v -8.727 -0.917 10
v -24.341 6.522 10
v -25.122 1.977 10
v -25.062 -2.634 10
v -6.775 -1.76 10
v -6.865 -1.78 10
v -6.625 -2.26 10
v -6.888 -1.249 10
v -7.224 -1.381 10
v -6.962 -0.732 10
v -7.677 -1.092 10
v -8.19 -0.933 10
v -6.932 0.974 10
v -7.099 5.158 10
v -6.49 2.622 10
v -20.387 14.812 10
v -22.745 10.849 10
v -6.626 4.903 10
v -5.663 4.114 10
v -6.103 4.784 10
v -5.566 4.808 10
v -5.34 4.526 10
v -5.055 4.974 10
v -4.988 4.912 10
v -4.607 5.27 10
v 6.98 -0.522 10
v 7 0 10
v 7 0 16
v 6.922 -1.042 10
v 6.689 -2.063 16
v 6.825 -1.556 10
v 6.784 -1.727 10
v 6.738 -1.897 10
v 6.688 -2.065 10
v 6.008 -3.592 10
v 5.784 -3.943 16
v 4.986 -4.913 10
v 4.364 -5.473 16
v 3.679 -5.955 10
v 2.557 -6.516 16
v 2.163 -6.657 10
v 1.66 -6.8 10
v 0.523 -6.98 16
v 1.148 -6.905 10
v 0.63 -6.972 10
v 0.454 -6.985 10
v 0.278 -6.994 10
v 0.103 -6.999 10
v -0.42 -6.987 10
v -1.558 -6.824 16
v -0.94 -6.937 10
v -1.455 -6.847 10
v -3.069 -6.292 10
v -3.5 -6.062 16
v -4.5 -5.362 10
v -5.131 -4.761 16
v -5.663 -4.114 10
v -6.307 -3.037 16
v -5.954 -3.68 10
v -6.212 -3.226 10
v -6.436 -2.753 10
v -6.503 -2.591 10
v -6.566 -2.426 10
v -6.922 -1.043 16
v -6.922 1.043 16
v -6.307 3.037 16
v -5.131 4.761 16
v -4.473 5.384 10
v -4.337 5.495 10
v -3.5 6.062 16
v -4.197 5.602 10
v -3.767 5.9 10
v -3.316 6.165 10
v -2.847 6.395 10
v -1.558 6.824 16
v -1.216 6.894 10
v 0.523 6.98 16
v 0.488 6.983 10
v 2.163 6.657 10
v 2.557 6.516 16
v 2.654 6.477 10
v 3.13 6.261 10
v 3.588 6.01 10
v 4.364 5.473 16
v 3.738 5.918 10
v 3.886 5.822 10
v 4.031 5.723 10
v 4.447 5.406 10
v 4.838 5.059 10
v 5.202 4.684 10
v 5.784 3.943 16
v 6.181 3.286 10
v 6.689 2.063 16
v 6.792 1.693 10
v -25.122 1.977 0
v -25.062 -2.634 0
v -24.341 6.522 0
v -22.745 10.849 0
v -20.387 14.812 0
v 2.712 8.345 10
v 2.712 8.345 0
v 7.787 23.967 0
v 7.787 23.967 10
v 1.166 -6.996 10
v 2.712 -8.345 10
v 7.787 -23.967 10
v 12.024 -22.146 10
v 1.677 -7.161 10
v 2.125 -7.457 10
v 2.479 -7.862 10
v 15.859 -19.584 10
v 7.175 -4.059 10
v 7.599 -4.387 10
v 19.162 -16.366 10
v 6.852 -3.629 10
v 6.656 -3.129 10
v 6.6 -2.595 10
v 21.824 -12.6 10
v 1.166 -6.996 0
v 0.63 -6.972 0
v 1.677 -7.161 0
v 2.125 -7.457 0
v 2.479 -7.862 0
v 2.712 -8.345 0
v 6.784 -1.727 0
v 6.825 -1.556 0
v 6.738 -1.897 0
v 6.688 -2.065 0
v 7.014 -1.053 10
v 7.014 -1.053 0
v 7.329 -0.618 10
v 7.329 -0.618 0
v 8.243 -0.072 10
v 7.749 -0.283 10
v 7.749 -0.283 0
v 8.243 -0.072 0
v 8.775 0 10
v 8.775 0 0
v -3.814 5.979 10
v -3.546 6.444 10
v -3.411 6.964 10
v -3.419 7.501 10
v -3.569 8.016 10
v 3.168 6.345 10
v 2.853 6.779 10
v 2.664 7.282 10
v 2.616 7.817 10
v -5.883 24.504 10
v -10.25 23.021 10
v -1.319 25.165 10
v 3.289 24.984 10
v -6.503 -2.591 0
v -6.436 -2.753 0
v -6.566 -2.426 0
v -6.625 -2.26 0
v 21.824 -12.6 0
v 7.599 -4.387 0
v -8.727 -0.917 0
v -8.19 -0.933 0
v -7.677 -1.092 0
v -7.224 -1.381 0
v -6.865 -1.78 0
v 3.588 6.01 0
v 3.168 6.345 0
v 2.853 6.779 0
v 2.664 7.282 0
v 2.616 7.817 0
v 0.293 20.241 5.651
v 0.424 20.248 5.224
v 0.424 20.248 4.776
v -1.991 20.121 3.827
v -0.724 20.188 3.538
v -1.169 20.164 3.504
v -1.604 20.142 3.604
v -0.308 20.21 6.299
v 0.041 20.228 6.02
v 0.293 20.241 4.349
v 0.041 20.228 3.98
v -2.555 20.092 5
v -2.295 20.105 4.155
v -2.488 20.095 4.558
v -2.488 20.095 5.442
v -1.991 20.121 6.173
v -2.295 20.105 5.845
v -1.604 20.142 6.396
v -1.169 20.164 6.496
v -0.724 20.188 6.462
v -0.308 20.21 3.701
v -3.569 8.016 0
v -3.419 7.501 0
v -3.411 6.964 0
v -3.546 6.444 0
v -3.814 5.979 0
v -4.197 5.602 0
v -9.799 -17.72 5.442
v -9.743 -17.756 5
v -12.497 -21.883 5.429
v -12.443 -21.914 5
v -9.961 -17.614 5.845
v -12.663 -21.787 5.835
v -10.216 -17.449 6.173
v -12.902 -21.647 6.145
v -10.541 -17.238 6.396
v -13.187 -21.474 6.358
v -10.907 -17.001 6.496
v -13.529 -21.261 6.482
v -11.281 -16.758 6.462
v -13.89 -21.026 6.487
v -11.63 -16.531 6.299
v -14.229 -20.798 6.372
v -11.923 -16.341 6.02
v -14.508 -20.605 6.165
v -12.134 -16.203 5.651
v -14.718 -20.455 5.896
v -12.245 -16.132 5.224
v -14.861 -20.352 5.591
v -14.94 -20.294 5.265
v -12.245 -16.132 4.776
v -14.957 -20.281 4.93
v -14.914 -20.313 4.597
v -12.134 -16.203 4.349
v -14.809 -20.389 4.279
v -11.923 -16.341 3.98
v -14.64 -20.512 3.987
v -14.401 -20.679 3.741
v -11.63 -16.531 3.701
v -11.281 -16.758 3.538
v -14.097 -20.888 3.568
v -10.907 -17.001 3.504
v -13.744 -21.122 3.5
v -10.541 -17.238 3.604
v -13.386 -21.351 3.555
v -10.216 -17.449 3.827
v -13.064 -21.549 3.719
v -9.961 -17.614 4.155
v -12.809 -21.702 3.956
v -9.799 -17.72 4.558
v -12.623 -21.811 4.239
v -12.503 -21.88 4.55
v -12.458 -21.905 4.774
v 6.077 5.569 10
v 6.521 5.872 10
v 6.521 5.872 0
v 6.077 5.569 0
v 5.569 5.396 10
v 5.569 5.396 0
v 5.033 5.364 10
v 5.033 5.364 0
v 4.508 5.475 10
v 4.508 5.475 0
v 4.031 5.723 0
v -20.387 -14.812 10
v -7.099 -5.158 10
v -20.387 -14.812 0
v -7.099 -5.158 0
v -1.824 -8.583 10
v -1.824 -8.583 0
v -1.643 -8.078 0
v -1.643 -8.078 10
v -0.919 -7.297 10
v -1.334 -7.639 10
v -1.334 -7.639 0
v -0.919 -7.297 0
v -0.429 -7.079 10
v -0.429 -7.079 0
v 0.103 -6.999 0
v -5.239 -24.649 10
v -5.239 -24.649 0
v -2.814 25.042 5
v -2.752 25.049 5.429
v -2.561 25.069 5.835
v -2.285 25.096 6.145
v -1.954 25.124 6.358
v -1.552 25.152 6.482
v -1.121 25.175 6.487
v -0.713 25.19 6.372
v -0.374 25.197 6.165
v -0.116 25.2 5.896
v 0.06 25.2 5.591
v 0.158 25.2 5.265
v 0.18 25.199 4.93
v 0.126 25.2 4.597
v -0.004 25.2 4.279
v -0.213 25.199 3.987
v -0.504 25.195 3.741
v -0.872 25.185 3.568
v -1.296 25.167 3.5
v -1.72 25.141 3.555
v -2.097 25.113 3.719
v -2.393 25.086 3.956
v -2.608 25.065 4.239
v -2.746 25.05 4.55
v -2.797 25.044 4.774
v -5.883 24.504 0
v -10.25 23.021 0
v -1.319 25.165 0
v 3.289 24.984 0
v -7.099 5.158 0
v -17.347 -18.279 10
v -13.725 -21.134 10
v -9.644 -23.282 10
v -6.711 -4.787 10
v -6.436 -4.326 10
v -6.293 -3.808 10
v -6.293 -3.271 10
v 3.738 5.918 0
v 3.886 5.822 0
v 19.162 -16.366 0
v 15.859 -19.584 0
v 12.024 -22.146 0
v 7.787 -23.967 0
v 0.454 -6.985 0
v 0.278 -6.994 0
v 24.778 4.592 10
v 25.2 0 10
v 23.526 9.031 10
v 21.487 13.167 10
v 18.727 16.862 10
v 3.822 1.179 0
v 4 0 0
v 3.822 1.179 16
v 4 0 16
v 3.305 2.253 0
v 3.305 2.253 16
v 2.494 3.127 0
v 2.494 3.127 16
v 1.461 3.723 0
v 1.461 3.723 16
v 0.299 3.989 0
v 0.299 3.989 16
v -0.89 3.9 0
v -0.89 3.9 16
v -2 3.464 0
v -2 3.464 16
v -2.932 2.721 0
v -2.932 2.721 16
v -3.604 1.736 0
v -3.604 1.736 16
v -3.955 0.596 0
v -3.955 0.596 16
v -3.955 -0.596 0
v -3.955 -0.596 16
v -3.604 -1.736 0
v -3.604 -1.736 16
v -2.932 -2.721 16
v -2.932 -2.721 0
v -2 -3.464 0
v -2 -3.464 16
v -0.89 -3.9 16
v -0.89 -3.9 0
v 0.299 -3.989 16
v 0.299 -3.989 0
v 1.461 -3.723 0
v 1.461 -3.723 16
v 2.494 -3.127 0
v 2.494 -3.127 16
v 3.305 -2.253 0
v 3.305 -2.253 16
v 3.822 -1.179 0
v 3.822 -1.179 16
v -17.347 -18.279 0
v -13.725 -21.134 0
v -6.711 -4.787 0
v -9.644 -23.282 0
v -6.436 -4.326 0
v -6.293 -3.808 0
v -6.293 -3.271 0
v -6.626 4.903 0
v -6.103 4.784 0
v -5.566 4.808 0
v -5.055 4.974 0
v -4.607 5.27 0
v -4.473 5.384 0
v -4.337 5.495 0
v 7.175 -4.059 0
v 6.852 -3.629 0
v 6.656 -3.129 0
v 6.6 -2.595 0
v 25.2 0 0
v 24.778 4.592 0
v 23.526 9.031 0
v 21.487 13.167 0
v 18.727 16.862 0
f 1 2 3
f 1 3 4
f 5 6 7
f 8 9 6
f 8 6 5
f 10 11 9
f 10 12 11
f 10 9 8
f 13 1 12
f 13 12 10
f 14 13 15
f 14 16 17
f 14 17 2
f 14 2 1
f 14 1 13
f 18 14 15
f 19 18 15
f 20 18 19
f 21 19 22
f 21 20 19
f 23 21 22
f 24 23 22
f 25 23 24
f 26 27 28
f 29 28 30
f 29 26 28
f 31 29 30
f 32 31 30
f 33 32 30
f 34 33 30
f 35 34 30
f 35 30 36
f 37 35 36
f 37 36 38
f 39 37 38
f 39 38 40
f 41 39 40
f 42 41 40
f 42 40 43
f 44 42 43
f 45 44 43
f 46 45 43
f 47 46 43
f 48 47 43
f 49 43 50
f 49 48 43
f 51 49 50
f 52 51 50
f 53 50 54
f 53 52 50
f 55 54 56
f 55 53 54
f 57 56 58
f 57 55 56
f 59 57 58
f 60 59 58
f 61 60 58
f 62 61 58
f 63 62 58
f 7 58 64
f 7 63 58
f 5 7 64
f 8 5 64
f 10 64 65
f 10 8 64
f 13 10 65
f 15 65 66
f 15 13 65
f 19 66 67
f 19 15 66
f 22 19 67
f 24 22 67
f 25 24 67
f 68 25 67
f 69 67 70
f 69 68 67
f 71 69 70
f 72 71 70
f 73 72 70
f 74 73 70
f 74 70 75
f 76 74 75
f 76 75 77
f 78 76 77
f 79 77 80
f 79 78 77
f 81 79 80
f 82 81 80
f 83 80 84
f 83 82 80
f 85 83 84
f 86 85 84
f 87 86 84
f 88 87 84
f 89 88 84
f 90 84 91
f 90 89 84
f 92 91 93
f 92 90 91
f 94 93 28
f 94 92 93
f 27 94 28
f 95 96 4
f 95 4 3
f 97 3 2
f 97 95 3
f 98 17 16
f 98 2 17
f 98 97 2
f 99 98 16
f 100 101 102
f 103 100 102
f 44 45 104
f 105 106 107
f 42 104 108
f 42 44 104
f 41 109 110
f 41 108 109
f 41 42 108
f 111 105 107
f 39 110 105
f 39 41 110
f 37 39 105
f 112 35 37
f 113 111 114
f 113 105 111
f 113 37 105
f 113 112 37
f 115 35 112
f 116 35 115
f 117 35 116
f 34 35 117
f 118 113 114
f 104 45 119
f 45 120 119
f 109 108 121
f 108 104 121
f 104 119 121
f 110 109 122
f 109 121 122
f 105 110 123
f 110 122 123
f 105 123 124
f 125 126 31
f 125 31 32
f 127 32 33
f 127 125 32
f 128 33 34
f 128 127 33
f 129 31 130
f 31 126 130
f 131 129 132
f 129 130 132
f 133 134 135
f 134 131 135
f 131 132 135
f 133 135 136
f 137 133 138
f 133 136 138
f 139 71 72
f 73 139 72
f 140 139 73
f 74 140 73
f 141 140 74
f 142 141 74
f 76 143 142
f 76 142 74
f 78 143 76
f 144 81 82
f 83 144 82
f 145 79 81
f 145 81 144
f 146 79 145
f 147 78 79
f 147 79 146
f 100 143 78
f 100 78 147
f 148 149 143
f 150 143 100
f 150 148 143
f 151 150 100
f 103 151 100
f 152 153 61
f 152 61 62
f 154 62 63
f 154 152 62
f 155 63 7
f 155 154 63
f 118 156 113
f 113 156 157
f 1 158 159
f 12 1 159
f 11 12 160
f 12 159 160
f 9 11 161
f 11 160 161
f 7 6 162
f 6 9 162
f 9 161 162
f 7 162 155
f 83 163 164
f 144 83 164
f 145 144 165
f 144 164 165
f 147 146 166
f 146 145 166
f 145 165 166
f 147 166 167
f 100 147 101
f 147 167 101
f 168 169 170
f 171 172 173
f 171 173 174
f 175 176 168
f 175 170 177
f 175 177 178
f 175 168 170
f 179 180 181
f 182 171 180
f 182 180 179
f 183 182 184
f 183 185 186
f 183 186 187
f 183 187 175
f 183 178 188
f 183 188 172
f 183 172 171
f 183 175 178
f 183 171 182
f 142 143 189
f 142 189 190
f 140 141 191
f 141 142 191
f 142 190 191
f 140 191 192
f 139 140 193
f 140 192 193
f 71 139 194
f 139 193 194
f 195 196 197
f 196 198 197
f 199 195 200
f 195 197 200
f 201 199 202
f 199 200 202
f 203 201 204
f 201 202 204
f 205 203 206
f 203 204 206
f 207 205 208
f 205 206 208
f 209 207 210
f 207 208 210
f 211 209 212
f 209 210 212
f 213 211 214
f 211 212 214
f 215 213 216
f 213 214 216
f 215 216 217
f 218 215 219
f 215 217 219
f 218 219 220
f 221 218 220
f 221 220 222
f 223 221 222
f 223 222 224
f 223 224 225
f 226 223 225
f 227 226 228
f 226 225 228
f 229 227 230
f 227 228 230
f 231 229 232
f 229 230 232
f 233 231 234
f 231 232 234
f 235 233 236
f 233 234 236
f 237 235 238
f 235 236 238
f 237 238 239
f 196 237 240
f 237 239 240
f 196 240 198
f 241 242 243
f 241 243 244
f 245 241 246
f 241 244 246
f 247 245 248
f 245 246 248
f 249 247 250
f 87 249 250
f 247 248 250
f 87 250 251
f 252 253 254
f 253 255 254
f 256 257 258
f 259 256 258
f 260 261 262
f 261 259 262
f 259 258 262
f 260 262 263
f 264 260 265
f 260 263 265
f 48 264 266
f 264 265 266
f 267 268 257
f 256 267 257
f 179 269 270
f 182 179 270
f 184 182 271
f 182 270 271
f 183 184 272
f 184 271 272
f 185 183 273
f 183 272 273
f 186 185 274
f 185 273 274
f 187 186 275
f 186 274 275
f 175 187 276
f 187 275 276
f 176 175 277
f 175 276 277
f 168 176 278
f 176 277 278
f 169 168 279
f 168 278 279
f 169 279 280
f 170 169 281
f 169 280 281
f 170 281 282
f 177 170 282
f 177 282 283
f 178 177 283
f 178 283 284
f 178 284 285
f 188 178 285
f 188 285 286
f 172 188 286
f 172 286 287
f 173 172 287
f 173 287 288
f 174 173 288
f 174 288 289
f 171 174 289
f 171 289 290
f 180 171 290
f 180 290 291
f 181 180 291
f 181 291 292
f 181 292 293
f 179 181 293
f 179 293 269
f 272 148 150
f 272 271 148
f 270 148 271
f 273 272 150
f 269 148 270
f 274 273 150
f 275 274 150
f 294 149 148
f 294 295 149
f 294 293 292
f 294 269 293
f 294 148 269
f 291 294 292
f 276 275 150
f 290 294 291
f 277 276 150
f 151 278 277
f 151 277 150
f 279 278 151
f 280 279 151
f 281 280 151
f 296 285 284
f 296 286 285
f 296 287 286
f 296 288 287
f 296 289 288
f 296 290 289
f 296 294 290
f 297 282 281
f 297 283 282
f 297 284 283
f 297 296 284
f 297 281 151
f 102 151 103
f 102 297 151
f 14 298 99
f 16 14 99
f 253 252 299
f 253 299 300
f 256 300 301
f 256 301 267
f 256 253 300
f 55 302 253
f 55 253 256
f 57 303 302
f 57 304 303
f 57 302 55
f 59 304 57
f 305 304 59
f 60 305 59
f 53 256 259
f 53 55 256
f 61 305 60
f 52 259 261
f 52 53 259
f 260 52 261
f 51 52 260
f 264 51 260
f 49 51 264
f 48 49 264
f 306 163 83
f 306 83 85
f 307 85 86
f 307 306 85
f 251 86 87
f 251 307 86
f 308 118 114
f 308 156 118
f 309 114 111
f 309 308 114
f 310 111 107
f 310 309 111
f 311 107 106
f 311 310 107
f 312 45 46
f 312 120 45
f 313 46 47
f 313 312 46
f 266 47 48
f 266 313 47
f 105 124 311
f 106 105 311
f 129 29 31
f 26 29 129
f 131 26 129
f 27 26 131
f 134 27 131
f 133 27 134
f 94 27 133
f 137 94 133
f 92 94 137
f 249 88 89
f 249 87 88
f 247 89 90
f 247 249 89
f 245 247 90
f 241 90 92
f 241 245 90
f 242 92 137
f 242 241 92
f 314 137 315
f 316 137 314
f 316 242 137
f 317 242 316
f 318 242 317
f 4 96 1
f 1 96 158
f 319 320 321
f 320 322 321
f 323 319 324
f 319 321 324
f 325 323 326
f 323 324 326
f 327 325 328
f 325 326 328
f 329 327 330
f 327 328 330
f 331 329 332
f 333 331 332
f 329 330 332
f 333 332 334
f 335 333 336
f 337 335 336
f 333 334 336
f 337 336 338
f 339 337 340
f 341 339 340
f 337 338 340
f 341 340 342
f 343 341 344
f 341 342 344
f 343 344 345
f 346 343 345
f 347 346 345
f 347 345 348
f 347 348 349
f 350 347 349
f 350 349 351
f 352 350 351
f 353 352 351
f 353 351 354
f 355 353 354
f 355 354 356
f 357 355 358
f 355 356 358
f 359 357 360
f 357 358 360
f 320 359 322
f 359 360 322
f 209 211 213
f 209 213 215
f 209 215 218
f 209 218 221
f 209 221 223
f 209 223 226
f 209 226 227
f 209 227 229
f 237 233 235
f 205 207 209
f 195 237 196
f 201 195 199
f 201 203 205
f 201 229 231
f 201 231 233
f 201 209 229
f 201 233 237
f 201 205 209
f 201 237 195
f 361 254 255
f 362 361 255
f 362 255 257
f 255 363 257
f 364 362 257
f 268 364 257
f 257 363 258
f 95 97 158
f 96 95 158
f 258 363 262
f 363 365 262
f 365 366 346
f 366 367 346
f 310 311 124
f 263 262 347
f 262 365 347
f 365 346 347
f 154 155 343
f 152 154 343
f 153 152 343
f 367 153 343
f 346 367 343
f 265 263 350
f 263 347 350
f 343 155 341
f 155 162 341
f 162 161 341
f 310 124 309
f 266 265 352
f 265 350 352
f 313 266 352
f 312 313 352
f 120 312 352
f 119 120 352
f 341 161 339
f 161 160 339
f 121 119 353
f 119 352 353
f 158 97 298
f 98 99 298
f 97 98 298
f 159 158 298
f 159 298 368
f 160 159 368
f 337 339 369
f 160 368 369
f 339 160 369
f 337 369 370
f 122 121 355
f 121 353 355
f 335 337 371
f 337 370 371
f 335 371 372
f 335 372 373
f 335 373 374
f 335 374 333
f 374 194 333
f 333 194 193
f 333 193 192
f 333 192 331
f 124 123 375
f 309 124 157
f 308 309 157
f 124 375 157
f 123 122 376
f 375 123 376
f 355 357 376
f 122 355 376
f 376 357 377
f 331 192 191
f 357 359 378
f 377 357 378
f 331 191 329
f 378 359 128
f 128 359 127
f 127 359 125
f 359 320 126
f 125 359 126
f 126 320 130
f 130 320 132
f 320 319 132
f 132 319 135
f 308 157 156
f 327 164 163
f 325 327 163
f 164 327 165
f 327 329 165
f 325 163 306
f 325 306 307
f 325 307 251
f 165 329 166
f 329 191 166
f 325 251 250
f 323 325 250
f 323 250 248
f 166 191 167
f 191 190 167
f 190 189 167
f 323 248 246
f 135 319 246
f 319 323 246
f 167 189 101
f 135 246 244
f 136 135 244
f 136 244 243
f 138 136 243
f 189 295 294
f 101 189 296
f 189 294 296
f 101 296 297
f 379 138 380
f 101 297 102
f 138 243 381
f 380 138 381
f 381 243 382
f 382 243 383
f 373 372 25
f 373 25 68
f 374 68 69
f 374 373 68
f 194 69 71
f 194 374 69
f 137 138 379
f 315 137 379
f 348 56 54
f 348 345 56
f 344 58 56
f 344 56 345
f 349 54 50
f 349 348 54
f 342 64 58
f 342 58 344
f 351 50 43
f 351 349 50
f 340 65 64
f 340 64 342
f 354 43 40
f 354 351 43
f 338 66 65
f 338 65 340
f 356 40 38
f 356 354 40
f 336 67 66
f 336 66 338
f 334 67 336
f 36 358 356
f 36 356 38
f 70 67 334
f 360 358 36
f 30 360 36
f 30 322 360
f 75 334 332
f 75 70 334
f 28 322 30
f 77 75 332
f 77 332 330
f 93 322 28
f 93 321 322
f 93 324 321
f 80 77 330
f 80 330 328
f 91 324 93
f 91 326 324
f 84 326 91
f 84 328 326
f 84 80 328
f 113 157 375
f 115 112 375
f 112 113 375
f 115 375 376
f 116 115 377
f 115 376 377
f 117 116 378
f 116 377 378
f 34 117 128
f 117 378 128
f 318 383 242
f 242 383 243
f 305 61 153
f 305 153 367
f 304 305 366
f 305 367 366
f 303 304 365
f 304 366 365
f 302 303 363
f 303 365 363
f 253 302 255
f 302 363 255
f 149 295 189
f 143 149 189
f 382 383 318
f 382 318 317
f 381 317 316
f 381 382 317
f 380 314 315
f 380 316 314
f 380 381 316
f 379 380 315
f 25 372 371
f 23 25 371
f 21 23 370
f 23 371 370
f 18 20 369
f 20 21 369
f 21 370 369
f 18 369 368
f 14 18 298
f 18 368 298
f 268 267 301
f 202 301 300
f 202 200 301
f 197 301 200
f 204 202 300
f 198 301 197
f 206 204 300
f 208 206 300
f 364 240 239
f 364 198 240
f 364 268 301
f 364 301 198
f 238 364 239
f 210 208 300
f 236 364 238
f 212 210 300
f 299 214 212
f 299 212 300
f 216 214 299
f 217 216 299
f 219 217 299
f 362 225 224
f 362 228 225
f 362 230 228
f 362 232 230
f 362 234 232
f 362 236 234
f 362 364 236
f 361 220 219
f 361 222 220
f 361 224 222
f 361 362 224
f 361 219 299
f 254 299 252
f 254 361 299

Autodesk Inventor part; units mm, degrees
ref_plane "YZ Plane" through (0, 0, 0) normal (1, 0, 0) x (0, 1, 0)
ref_plane "XZ Plane" through (0, 0, 0) normal (0, 1, 0) x (-1, 0, 0)
sketch "Sketch1" plane through (0, 0, 0) normal (0, 0, 1) x (1, 0, 0)
  circle A0 centre (0, 0) radius 25.2
  dimension "d0" = 50.4
sketch "Sketch1 outline for Extrusion1" plane through (0, 0, 0) normal (0, 0, 1) x (1, 0, 0)
  circle A0 centre (0, 0) radius 25.2
extrude "Extrusion1" add sketch "Sketch1 outline for Extrusion1" along normal blind 10
sketch "Sketch2" plane through (0, 0, 10) normal (0, 0, 1) x (1, 0, 0)
  circle A0 centre (0, 0) radius 25.2 projected
  circle A1 centre (0, 0) radius 7
  dimension "d3" = 14
sketch "Sketch2 outline for Extrusion2" plane through (0, 0, 10) normal (0, 0, 1) x (1, 0, 0)
  circle A0 centre (0, 0) radius 7
extrude "Extrusion2" add sketch "Sketch2 outline for Extrusion2" along normal blind 6
sketch "Sketch4" plane through (0, 0, 16) normal (0, 0, 1) x (1, 0, 0)
  circle A0 centre (0, 0) radius 7 projected
  circle A1 centre (0, 0) radius 4
  dimension "d9" = 8
sketch "Sketch4 outline for Extrusion4" plane through (0, 0, 16) normal (0, 0, 1) x (1, 0, 0)
  circle A0 centre (0, 0) radius 4
extrude "Extrusion4" cut sketch "Sketch4 outline for Extrusion4" against normal through all
sketch "Sketch8" plane through (0, 0, 0) normal (0, 0, -1) x (-1, 0, 0)
  line L0 (0, 0) -> (-25.2, 0)
  circle A0 centre (0, 0) radius 25.2
  circle A1 centre (0, 0) radius 7
  line L1 (0, 0) -> (-21.82384, -12.6)
  point P0 (-6.062178, -3.5)
  point P1 (-7, 0)
  dimension "d23" = 30
sketch "Sketch8 outline for Extrusion8" plane through (0, 0, 0) normal (0, 0, -1) x (-1, 0, 0)
  line L0 (-21.82384, -12.6) -> (-6.062178, -3.5)
  arc A0 (-25.2, 0) -> (-21.82384, -12.6) centre (0, 0) ccw
  line L1 (-7, 0) -> (-25.2, 0)
  arc A1 (-6.062178, -3.5) -> (-7, 0) centre (0, 0) cw
extrude "Extrusion8" cut sketch "Sketch8 outline for Extrusion8" against normal blind 10
pattern_circular "Circular Pattern1" count 5 over 360 about axis through (0, 0, 16) along (0, 0, -1) of "Extrusion8"
fillet "Fillet1" radius 2 10 edges at (5.202, 4.6839, 5) (2.1631, 6.6574, 5) (-2.8472, 6.3948, 5) (-5.6631, 4.1145, 5) (-6.9617, -0.7317, 5) (-5.6631, -4.1145, 5) (-1.4554, -6.847, 5) (2.1631, -6.6574, 5) (7, 0, 5) (6.0622, -3.5, 5)
ref_plane "Work Plane1" through (-1.318866, 25.165464, 0) normal (-0.052336, 0.9986295, 0) x (-0.9986295, -0.052336, 0)
sketch "Sketch9" plane through (-1.318866, 25.165464, 0) normal (-0.052336, 0.9986295, 0) x (-0.9986295, -0.052336, 0)
  circle A0 centre (0, 5) radius 1.5
  point P0 (0, 0)
  dimension "d30" = 3
  dimension "d31" = 5
sketch "Sketch9 outline for Extrusion9" plane through (-1.318866, 25.165464, 0) normal (-0.052336, 0.9986295, 0) x (-0.9986295, -0.052336, 0)
  circle A0 centre (0, 5) radius 1.5
extrude "Extrusion9" cut sketch "Sketch9 outline for Extrusion9" against normal blind 5
pattern_circular "Circular Pattern2" count 2 over 144 about axis through (0, 0, 16) along (0, 0, 1) of "Extrusion9"
properties part number "1313_Drive Coil End_V1" material "ABS Plastic"
